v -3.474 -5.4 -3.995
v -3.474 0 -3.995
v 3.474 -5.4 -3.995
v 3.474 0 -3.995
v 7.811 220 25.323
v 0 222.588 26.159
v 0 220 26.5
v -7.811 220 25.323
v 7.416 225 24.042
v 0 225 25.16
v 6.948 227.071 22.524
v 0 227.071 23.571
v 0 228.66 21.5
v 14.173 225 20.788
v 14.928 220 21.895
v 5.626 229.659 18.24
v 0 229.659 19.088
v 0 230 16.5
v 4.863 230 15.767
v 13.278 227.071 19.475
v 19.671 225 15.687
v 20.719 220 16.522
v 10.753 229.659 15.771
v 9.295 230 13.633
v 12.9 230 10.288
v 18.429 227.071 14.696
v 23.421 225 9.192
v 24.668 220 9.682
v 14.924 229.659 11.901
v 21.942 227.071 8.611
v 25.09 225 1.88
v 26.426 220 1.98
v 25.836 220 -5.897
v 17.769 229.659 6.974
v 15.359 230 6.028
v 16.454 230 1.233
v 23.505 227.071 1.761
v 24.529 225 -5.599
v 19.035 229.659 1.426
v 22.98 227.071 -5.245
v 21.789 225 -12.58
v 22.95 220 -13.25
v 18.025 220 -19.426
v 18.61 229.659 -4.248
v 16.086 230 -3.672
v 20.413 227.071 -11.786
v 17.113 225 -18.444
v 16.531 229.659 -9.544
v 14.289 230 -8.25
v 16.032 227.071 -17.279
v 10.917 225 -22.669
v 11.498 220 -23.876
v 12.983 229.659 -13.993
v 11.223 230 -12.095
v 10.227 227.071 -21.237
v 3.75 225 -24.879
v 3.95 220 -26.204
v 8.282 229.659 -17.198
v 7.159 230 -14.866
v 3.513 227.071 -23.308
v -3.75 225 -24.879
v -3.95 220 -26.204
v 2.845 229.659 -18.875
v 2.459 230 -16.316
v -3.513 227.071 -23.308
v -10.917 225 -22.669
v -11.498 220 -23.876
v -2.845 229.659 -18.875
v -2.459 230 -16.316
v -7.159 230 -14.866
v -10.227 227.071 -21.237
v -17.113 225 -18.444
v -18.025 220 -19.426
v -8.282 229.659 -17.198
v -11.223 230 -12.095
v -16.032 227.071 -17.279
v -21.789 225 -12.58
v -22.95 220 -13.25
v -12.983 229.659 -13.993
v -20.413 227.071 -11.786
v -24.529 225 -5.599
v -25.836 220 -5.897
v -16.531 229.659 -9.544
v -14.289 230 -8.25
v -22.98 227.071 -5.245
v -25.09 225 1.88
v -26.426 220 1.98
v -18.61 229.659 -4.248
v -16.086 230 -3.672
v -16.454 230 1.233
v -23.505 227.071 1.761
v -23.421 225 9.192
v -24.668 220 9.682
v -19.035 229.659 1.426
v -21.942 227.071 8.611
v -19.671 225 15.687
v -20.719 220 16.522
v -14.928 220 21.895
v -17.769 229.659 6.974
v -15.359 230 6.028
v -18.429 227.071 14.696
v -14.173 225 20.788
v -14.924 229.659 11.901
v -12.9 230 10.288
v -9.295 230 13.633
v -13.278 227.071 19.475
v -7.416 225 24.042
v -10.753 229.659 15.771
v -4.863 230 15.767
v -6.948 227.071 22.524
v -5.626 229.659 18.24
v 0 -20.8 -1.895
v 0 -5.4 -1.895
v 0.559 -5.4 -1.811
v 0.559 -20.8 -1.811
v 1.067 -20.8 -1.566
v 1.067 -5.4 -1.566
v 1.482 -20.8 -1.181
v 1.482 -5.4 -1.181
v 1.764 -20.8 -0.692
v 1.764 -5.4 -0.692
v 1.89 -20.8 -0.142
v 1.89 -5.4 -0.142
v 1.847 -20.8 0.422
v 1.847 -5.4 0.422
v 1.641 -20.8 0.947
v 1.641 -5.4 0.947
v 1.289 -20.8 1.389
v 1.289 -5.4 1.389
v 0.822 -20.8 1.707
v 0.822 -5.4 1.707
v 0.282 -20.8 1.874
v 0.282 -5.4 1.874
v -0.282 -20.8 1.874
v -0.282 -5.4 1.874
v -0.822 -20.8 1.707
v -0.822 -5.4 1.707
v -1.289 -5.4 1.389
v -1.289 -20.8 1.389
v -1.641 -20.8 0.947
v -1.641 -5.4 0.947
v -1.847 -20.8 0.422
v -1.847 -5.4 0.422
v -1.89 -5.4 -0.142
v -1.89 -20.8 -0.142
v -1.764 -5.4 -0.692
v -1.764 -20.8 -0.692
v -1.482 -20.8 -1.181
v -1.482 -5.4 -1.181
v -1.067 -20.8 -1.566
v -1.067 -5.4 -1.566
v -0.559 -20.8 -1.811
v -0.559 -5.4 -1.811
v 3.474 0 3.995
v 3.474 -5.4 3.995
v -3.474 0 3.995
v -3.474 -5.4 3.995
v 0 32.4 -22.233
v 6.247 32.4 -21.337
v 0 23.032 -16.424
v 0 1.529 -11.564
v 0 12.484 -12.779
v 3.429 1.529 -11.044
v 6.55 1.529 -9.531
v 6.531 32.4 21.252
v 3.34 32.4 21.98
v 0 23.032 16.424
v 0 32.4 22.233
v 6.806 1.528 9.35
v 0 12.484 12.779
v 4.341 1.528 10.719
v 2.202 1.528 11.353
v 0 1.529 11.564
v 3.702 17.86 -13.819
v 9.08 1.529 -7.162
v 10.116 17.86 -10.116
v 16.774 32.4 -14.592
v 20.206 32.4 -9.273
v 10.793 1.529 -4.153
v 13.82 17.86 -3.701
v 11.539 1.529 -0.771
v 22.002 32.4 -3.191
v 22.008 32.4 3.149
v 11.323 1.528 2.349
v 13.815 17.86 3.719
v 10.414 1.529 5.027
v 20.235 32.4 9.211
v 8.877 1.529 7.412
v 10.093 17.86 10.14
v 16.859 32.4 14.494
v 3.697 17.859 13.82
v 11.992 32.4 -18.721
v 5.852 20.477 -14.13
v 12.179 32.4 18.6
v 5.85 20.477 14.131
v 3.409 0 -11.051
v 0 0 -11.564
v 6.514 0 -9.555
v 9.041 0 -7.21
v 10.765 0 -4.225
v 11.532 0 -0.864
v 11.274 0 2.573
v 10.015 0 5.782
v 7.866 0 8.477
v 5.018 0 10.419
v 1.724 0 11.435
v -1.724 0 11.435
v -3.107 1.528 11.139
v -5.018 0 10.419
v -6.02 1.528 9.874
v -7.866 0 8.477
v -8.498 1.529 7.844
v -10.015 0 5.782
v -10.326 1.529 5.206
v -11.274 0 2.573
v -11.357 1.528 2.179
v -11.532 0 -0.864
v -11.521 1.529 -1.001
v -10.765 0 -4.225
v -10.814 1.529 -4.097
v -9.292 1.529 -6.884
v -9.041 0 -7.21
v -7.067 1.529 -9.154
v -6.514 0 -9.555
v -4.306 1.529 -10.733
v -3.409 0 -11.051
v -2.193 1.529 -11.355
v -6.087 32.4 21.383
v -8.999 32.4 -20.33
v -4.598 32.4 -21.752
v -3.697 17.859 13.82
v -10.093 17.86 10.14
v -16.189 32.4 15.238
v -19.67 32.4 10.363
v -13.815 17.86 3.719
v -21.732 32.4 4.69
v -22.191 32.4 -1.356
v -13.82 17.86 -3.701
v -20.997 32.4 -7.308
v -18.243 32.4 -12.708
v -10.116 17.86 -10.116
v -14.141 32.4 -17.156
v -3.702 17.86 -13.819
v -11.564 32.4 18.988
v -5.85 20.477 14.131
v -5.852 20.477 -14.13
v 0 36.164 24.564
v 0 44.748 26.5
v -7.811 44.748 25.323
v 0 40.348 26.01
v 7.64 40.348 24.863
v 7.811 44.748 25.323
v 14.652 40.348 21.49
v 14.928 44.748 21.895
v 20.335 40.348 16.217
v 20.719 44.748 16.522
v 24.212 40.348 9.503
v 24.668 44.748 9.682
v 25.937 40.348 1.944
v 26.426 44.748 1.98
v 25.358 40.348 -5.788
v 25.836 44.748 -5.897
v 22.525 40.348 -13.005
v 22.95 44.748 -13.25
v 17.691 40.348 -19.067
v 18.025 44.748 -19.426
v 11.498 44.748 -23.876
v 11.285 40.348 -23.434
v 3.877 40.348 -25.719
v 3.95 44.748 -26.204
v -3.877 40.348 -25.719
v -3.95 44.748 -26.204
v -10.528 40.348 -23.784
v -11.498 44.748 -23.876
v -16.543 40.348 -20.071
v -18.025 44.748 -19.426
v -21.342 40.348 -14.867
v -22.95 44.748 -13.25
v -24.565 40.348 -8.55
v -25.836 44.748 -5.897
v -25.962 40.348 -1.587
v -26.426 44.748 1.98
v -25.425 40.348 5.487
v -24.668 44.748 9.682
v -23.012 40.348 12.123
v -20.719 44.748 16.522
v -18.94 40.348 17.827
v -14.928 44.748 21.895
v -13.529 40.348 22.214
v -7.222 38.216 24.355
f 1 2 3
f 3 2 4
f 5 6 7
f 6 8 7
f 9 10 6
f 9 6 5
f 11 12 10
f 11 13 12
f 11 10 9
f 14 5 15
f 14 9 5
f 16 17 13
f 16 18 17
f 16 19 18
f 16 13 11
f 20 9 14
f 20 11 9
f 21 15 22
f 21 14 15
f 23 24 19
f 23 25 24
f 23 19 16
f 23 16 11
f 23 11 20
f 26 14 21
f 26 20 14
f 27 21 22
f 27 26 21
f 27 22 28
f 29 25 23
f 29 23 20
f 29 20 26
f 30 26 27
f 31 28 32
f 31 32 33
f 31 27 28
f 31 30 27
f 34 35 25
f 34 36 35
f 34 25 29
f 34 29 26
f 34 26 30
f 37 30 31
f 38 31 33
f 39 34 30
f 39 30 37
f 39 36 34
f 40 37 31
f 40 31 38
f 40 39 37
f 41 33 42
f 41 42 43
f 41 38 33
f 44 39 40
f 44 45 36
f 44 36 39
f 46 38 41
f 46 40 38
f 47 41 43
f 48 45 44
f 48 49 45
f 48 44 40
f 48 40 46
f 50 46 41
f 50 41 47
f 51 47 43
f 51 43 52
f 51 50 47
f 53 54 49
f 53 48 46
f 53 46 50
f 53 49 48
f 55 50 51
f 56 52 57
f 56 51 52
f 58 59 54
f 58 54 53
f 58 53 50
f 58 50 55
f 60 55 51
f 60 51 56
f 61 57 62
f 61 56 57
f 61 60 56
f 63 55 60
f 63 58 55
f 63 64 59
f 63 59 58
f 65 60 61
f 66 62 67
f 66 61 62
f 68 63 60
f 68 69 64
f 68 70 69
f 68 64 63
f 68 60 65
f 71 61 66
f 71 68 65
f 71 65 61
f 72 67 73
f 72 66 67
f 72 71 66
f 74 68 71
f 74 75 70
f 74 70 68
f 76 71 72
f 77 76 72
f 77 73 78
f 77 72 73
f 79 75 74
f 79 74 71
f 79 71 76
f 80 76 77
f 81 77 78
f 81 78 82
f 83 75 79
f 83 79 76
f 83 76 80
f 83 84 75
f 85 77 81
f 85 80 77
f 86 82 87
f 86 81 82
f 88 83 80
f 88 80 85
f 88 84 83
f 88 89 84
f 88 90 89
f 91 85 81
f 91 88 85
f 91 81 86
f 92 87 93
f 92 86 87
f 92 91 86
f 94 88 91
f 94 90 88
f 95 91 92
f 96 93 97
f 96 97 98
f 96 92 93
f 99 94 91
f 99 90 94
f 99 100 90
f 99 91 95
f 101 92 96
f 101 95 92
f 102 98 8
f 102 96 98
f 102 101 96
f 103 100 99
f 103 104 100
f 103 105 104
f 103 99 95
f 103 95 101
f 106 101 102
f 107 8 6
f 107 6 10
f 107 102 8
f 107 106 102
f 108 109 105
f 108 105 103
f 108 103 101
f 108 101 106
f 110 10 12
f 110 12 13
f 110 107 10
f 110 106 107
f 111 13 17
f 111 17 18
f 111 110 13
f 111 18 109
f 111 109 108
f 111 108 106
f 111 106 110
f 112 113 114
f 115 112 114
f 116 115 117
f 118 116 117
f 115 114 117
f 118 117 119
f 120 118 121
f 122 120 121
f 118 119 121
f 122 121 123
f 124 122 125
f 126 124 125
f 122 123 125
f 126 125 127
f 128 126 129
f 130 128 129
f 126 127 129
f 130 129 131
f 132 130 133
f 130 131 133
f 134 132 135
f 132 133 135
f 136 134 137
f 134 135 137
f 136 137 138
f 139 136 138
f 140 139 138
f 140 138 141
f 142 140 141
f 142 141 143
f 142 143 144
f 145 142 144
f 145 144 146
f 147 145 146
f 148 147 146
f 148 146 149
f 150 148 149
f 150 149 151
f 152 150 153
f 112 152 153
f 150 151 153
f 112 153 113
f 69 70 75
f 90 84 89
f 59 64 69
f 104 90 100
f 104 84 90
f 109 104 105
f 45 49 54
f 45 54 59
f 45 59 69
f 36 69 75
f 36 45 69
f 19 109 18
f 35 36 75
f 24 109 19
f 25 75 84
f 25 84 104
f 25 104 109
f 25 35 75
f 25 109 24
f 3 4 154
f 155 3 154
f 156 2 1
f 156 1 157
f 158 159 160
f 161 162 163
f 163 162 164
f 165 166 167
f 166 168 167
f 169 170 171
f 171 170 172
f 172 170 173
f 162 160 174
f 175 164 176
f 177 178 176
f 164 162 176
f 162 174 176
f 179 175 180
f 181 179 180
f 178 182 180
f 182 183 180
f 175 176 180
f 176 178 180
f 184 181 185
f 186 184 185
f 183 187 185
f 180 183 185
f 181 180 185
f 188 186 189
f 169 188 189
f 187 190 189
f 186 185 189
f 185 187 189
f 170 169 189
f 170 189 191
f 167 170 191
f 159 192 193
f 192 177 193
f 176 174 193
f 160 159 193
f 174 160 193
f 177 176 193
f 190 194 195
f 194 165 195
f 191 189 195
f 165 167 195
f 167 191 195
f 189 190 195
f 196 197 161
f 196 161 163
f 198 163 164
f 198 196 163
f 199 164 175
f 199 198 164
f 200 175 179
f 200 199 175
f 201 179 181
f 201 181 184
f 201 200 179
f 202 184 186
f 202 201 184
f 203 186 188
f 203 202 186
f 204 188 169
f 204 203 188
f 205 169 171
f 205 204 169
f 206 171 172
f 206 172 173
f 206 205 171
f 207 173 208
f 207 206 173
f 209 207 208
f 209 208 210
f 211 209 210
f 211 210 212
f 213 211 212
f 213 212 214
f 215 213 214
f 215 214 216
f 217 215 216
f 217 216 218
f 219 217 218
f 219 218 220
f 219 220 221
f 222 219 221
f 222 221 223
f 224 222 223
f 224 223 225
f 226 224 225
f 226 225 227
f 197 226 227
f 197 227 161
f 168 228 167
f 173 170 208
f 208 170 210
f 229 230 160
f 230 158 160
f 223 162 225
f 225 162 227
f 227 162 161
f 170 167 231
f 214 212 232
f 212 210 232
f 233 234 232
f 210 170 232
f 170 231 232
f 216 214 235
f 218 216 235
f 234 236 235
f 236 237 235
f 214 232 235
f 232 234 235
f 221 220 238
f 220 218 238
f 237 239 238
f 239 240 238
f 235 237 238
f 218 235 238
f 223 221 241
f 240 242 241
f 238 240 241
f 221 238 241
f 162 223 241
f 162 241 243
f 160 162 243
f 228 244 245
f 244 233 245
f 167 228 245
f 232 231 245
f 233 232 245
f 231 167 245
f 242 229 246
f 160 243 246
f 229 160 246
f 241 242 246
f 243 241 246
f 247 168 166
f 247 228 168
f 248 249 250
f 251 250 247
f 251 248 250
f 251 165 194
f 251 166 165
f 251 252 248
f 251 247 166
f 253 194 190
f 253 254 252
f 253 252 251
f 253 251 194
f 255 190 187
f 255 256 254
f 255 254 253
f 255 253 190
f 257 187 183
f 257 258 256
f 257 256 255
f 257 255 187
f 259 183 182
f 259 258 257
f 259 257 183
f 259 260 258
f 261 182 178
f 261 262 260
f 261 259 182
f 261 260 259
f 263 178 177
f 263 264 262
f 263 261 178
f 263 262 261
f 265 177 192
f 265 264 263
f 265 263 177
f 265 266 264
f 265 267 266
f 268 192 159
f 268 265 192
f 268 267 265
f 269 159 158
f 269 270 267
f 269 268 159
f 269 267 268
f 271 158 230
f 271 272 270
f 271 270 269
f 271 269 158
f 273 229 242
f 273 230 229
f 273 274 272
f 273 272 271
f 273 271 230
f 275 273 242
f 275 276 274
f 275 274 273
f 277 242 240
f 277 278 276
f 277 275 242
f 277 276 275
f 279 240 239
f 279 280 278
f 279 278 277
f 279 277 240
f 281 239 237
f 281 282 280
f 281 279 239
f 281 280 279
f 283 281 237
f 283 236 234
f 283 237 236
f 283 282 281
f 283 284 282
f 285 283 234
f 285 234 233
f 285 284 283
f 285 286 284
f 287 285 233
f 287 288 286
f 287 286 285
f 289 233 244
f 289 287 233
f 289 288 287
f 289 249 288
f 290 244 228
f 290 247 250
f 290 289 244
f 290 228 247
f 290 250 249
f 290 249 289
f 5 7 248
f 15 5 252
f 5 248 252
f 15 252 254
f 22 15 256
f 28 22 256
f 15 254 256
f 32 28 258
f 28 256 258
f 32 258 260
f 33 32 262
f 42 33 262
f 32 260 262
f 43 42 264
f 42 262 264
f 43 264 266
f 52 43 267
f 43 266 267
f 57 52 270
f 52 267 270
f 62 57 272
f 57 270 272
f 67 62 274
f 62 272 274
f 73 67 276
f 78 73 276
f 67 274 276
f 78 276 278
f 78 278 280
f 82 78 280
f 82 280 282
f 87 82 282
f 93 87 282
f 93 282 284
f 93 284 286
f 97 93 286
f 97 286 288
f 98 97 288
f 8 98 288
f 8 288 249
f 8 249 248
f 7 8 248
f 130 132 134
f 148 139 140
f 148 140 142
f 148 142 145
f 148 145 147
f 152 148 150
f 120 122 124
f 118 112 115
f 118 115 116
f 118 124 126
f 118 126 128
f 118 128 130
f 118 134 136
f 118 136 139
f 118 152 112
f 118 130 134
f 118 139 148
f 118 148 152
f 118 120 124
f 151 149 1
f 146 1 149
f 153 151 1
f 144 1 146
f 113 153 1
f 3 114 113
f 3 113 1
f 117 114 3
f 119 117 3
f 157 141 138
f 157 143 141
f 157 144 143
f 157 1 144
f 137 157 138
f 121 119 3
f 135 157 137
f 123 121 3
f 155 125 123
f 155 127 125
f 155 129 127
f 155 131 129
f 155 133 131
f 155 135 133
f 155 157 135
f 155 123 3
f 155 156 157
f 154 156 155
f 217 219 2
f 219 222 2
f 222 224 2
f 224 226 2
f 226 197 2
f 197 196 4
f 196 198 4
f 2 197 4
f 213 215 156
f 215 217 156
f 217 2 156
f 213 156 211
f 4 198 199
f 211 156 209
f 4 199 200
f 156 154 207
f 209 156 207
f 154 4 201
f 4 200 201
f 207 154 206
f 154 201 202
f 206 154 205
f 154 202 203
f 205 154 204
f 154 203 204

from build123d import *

# Parameters (mm, degrees)
SKETCH1_R           = 26.5
BOSS_EXTRUDE1_DEPTH = 230
SKETCH2_R           = 26.5
SKETCH2_R_2         = 11.564416293
CUT_EXTRUDE1_DEPTH  = 25.4
FILLET1_R           = 20
FILLET2_R           = 50
FILLET3_R           = 10
SKETCH3_W           = 6.947530086
SKETCH3_H           = 7.989839498
BOSS_EXTRUDE2_DEPTH = 5.4
SKETCH4_R           = 1.894960562
BOSS_EXTRUDE3_DEPTH = 15.4


with BuildPart() as part:
    # Sketch1 → Boss-Extrude1 (new body)
    with BuildSketch(Plane(origin=(0, 0, 0), x_dir=(1, 0, 0), z_dir=(0, 1, 0))):
        with Locations(Location((0, 0, 0), (0, 0, 270))):
            Circle(SKETCH1_R)
    extrude(amount=BOSS_EXTRUDE1_DEPTH)

    # Sketch2 → Cut-Extrude1 (cut)
    with BuildSketch(Plane.XZ):
        with Locations(Location((0, 0, 0), (0, 0, 270))):
            Circle(SKETCH2_R)
        with Locations(Location((0, 0, 0), (0, 0, 270))):
            Circle(SKETCH2_R_2, mode=Mode.SUBTRACT)
    extrude(amount=-CUT_EXTRUDE1_DEPTH, mode=Mode.SUBTRACT)

    # Fillet1
    # the kernel refuses this fillet: 20 mm, written as the material it takes off along each edge
    with BuildSketch(Plane(origin=(0, 25.4, 0), x_dir=(0, 0, 1), z_dir=(-1, 0, 0))) as fillet1_piece_1:
        with BuildLine():
            CenterArc((6.5, 19.348170136), FILLET1_R, 284.668185606, 75.331814394)
            Line((11.564416293, 0), (11.665704619, -0.386963403))
            ThreePointArc((11.665704619, -0.386963403), (19.032208147, -0.4), (26.5, -0.4))
            Line((26.5, -0.4), (26.9, 0))
            Line((26.9, 0), (26.9, 19.348170136))
            Line((26.9, 19.348170136), (26.5, 19.348170136))
        make_face()
    revolve(axis=Axis((0, 25.4, 0), (0, 1, 0)), mode=Mode.SUBTRACT)

    # Fillet2
    fillet2_edges = [part.edges().sort_by_distance(p)[0] for p in [
        (11.564416293, 25.4, 0),
    ]]
    fillet(fillet2_edges, radius=FILLET2_R)

    # Fillet3
    fillet3_edges = [part.edges().sort_by_distance(p)[0] for p in [
        (0, 230, -26.5),
    ]]
    fillet(fillet3_edges, radius=FILLET3_R)

    # Sketch3 → Boss-Extrude2 (add)
    with BuildSketch(Plane.XZ):
        Rectangle(SKETCH3_W, SKETCH3_H)
    extrude(amount=BOSS_EXTRUDE2_DEPTH)

    # Sketch4 → Boss-Extrude3 (add)
    with BuildSketch(Plane(origin=(0, -5.4, 0), x_dir=(-1, 0, 0), z_dir=(0, -1, 0))):
        with Locations(Location((0, 0, 0), (0, 0, 90))):
            Circle(SKETCH4_R)
    extrude(amount=BOSS_EXTRUDE3_DEPTH)


solid = part.part
